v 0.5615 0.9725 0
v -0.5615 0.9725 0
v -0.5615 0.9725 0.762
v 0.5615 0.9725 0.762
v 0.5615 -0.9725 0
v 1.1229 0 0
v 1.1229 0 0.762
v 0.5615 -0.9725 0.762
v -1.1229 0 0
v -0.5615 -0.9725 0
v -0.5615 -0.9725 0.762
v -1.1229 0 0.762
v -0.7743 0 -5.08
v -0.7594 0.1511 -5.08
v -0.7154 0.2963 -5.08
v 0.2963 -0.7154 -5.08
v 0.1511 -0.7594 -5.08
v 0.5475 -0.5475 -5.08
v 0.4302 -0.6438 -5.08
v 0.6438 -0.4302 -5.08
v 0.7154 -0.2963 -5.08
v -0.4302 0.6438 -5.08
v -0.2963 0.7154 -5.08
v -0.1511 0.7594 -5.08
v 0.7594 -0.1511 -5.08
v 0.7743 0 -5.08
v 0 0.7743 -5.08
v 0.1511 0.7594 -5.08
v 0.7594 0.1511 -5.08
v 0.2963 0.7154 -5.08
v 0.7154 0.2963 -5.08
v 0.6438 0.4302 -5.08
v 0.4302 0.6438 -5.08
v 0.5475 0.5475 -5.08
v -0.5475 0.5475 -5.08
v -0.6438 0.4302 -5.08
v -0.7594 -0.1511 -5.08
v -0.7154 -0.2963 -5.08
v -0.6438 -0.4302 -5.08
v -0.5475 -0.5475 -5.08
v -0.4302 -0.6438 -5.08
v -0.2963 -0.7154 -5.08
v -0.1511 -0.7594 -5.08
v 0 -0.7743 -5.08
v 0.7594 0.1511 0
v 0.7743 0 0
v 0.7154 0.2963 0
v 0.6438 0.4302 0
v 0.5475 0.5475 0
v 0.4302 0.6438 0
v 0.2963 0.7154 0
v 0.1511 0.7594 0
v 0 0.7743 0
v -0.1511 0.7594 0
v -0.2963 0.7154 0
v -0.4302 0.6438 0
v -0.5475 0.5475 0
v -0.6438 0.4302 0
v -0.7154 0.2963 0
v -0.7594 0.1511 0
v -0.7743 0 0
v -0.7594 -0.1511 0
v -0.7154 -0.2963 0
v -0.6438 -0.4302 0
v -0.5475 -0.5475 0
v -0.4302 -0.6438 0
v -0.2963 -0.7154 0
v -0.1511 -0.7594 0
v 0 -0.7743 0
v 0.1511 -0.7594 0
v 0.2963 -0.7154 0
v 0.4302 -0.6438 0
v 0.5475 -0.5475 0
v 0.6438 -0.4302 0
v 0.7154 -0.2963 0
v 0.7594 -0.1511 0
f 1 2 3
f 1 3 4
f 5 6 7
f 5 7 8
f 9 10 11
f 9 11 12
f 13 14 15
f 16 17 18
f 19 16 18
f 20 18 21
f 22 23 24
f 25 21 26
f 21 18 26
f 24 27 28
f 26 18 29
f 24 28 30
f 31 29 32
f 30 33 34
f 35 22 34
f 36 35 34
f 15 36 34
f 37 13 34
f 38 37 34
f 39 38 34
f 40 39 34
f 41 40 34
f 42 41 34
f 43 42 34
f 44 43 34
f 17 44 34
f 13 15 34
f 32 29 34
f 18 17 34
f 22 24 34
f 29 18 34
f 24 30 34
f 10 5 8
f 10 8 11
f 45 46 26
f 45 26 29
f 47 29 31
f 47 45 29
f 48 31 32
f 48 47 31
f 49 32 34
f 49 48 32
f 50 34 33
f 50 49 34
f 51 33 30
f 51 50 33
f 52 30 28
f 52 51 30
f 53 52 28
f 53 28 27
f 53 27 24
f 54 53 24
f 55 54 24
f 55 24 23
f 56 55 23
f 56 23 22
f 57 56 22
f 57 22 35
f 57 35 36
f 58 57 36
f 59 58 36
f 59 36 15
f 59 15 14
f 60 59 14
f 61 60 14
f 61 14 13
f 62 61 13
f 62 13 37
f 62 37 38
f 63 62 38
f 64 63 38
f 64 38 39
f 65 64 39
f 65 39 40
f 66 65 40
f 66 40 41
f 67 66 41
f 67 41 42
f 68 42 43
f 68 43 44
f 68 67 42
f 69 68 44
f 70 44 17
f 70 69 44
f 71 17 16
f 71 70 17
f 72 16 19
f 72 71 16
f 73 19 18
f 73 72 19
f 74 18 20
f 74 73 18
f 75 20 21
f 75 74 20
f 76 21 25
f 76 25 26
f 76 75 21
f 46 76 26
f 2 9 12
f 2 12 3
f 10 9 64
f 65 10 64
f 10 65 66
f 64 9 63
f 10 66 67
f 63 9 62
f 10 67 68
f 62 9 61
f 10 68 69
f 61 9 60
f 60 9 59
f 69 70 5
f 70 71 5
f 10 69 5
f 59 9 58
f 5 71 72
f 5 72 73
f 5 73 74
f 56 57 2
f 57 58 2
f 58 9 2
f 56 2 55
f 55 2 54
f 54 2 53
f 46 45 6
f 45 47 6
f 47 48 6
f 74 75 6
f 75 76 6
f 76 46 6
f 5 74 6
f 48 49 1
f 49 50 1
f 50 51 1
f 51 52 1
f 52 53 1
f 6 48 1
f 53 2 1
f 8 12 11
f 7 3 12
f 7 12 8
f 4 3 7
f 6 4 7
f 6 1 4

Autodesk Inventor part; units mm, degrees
ref_plane "YZ Plane" through (0, 0, 0) normal (1, 0, 0) x (0, 1, 0)
ref_plane "XZ Plane" through (0, 0, 0) normal (0, 1, 0) x (-1, 0, 0)
ref_plane "XY Plane" through (0, 0, 0) normal (0, 0, 1) x (1, 0, 0)
sketch "Sketch1" plane through (0, 0, 0) normal (0, 0, 1) x (1, 0, 0)
  circle A0 centre (0, 0) radius 0.7743
extrude "Extrusion1" add sketch "Sketch1" against normal blind 5.08
sketch "Sketch2" plane through (0, 0, 0) normal (0, 0, 1) x (1, 0, 0)
  circle A0 centre (0, 0) radius 0.7743 projected
  line L0 (-1.1229, 0) -> (-0.5615, 0.9725)
  line L1 (-0.5615, 0.9725) -> (0.5615, 0.9725)
  line L2 (0.5615, 0.9725) -> (1.1229, 0)
  line L3 (1.1229, 0) -> (0.5615, -0.9725)
  line L4 (0.5615, -0.9725) -> (-0.5615, -0.9725)
  line L5 (-0.5615, -0.9725) -> (-1.1229, 0)
extrude "Extrusion2" add sketch "Sketch2" along normal blind 0.762 contours A0 | L0 L1 L2 L3 L4 L5
properties part number "BOLT 3"
